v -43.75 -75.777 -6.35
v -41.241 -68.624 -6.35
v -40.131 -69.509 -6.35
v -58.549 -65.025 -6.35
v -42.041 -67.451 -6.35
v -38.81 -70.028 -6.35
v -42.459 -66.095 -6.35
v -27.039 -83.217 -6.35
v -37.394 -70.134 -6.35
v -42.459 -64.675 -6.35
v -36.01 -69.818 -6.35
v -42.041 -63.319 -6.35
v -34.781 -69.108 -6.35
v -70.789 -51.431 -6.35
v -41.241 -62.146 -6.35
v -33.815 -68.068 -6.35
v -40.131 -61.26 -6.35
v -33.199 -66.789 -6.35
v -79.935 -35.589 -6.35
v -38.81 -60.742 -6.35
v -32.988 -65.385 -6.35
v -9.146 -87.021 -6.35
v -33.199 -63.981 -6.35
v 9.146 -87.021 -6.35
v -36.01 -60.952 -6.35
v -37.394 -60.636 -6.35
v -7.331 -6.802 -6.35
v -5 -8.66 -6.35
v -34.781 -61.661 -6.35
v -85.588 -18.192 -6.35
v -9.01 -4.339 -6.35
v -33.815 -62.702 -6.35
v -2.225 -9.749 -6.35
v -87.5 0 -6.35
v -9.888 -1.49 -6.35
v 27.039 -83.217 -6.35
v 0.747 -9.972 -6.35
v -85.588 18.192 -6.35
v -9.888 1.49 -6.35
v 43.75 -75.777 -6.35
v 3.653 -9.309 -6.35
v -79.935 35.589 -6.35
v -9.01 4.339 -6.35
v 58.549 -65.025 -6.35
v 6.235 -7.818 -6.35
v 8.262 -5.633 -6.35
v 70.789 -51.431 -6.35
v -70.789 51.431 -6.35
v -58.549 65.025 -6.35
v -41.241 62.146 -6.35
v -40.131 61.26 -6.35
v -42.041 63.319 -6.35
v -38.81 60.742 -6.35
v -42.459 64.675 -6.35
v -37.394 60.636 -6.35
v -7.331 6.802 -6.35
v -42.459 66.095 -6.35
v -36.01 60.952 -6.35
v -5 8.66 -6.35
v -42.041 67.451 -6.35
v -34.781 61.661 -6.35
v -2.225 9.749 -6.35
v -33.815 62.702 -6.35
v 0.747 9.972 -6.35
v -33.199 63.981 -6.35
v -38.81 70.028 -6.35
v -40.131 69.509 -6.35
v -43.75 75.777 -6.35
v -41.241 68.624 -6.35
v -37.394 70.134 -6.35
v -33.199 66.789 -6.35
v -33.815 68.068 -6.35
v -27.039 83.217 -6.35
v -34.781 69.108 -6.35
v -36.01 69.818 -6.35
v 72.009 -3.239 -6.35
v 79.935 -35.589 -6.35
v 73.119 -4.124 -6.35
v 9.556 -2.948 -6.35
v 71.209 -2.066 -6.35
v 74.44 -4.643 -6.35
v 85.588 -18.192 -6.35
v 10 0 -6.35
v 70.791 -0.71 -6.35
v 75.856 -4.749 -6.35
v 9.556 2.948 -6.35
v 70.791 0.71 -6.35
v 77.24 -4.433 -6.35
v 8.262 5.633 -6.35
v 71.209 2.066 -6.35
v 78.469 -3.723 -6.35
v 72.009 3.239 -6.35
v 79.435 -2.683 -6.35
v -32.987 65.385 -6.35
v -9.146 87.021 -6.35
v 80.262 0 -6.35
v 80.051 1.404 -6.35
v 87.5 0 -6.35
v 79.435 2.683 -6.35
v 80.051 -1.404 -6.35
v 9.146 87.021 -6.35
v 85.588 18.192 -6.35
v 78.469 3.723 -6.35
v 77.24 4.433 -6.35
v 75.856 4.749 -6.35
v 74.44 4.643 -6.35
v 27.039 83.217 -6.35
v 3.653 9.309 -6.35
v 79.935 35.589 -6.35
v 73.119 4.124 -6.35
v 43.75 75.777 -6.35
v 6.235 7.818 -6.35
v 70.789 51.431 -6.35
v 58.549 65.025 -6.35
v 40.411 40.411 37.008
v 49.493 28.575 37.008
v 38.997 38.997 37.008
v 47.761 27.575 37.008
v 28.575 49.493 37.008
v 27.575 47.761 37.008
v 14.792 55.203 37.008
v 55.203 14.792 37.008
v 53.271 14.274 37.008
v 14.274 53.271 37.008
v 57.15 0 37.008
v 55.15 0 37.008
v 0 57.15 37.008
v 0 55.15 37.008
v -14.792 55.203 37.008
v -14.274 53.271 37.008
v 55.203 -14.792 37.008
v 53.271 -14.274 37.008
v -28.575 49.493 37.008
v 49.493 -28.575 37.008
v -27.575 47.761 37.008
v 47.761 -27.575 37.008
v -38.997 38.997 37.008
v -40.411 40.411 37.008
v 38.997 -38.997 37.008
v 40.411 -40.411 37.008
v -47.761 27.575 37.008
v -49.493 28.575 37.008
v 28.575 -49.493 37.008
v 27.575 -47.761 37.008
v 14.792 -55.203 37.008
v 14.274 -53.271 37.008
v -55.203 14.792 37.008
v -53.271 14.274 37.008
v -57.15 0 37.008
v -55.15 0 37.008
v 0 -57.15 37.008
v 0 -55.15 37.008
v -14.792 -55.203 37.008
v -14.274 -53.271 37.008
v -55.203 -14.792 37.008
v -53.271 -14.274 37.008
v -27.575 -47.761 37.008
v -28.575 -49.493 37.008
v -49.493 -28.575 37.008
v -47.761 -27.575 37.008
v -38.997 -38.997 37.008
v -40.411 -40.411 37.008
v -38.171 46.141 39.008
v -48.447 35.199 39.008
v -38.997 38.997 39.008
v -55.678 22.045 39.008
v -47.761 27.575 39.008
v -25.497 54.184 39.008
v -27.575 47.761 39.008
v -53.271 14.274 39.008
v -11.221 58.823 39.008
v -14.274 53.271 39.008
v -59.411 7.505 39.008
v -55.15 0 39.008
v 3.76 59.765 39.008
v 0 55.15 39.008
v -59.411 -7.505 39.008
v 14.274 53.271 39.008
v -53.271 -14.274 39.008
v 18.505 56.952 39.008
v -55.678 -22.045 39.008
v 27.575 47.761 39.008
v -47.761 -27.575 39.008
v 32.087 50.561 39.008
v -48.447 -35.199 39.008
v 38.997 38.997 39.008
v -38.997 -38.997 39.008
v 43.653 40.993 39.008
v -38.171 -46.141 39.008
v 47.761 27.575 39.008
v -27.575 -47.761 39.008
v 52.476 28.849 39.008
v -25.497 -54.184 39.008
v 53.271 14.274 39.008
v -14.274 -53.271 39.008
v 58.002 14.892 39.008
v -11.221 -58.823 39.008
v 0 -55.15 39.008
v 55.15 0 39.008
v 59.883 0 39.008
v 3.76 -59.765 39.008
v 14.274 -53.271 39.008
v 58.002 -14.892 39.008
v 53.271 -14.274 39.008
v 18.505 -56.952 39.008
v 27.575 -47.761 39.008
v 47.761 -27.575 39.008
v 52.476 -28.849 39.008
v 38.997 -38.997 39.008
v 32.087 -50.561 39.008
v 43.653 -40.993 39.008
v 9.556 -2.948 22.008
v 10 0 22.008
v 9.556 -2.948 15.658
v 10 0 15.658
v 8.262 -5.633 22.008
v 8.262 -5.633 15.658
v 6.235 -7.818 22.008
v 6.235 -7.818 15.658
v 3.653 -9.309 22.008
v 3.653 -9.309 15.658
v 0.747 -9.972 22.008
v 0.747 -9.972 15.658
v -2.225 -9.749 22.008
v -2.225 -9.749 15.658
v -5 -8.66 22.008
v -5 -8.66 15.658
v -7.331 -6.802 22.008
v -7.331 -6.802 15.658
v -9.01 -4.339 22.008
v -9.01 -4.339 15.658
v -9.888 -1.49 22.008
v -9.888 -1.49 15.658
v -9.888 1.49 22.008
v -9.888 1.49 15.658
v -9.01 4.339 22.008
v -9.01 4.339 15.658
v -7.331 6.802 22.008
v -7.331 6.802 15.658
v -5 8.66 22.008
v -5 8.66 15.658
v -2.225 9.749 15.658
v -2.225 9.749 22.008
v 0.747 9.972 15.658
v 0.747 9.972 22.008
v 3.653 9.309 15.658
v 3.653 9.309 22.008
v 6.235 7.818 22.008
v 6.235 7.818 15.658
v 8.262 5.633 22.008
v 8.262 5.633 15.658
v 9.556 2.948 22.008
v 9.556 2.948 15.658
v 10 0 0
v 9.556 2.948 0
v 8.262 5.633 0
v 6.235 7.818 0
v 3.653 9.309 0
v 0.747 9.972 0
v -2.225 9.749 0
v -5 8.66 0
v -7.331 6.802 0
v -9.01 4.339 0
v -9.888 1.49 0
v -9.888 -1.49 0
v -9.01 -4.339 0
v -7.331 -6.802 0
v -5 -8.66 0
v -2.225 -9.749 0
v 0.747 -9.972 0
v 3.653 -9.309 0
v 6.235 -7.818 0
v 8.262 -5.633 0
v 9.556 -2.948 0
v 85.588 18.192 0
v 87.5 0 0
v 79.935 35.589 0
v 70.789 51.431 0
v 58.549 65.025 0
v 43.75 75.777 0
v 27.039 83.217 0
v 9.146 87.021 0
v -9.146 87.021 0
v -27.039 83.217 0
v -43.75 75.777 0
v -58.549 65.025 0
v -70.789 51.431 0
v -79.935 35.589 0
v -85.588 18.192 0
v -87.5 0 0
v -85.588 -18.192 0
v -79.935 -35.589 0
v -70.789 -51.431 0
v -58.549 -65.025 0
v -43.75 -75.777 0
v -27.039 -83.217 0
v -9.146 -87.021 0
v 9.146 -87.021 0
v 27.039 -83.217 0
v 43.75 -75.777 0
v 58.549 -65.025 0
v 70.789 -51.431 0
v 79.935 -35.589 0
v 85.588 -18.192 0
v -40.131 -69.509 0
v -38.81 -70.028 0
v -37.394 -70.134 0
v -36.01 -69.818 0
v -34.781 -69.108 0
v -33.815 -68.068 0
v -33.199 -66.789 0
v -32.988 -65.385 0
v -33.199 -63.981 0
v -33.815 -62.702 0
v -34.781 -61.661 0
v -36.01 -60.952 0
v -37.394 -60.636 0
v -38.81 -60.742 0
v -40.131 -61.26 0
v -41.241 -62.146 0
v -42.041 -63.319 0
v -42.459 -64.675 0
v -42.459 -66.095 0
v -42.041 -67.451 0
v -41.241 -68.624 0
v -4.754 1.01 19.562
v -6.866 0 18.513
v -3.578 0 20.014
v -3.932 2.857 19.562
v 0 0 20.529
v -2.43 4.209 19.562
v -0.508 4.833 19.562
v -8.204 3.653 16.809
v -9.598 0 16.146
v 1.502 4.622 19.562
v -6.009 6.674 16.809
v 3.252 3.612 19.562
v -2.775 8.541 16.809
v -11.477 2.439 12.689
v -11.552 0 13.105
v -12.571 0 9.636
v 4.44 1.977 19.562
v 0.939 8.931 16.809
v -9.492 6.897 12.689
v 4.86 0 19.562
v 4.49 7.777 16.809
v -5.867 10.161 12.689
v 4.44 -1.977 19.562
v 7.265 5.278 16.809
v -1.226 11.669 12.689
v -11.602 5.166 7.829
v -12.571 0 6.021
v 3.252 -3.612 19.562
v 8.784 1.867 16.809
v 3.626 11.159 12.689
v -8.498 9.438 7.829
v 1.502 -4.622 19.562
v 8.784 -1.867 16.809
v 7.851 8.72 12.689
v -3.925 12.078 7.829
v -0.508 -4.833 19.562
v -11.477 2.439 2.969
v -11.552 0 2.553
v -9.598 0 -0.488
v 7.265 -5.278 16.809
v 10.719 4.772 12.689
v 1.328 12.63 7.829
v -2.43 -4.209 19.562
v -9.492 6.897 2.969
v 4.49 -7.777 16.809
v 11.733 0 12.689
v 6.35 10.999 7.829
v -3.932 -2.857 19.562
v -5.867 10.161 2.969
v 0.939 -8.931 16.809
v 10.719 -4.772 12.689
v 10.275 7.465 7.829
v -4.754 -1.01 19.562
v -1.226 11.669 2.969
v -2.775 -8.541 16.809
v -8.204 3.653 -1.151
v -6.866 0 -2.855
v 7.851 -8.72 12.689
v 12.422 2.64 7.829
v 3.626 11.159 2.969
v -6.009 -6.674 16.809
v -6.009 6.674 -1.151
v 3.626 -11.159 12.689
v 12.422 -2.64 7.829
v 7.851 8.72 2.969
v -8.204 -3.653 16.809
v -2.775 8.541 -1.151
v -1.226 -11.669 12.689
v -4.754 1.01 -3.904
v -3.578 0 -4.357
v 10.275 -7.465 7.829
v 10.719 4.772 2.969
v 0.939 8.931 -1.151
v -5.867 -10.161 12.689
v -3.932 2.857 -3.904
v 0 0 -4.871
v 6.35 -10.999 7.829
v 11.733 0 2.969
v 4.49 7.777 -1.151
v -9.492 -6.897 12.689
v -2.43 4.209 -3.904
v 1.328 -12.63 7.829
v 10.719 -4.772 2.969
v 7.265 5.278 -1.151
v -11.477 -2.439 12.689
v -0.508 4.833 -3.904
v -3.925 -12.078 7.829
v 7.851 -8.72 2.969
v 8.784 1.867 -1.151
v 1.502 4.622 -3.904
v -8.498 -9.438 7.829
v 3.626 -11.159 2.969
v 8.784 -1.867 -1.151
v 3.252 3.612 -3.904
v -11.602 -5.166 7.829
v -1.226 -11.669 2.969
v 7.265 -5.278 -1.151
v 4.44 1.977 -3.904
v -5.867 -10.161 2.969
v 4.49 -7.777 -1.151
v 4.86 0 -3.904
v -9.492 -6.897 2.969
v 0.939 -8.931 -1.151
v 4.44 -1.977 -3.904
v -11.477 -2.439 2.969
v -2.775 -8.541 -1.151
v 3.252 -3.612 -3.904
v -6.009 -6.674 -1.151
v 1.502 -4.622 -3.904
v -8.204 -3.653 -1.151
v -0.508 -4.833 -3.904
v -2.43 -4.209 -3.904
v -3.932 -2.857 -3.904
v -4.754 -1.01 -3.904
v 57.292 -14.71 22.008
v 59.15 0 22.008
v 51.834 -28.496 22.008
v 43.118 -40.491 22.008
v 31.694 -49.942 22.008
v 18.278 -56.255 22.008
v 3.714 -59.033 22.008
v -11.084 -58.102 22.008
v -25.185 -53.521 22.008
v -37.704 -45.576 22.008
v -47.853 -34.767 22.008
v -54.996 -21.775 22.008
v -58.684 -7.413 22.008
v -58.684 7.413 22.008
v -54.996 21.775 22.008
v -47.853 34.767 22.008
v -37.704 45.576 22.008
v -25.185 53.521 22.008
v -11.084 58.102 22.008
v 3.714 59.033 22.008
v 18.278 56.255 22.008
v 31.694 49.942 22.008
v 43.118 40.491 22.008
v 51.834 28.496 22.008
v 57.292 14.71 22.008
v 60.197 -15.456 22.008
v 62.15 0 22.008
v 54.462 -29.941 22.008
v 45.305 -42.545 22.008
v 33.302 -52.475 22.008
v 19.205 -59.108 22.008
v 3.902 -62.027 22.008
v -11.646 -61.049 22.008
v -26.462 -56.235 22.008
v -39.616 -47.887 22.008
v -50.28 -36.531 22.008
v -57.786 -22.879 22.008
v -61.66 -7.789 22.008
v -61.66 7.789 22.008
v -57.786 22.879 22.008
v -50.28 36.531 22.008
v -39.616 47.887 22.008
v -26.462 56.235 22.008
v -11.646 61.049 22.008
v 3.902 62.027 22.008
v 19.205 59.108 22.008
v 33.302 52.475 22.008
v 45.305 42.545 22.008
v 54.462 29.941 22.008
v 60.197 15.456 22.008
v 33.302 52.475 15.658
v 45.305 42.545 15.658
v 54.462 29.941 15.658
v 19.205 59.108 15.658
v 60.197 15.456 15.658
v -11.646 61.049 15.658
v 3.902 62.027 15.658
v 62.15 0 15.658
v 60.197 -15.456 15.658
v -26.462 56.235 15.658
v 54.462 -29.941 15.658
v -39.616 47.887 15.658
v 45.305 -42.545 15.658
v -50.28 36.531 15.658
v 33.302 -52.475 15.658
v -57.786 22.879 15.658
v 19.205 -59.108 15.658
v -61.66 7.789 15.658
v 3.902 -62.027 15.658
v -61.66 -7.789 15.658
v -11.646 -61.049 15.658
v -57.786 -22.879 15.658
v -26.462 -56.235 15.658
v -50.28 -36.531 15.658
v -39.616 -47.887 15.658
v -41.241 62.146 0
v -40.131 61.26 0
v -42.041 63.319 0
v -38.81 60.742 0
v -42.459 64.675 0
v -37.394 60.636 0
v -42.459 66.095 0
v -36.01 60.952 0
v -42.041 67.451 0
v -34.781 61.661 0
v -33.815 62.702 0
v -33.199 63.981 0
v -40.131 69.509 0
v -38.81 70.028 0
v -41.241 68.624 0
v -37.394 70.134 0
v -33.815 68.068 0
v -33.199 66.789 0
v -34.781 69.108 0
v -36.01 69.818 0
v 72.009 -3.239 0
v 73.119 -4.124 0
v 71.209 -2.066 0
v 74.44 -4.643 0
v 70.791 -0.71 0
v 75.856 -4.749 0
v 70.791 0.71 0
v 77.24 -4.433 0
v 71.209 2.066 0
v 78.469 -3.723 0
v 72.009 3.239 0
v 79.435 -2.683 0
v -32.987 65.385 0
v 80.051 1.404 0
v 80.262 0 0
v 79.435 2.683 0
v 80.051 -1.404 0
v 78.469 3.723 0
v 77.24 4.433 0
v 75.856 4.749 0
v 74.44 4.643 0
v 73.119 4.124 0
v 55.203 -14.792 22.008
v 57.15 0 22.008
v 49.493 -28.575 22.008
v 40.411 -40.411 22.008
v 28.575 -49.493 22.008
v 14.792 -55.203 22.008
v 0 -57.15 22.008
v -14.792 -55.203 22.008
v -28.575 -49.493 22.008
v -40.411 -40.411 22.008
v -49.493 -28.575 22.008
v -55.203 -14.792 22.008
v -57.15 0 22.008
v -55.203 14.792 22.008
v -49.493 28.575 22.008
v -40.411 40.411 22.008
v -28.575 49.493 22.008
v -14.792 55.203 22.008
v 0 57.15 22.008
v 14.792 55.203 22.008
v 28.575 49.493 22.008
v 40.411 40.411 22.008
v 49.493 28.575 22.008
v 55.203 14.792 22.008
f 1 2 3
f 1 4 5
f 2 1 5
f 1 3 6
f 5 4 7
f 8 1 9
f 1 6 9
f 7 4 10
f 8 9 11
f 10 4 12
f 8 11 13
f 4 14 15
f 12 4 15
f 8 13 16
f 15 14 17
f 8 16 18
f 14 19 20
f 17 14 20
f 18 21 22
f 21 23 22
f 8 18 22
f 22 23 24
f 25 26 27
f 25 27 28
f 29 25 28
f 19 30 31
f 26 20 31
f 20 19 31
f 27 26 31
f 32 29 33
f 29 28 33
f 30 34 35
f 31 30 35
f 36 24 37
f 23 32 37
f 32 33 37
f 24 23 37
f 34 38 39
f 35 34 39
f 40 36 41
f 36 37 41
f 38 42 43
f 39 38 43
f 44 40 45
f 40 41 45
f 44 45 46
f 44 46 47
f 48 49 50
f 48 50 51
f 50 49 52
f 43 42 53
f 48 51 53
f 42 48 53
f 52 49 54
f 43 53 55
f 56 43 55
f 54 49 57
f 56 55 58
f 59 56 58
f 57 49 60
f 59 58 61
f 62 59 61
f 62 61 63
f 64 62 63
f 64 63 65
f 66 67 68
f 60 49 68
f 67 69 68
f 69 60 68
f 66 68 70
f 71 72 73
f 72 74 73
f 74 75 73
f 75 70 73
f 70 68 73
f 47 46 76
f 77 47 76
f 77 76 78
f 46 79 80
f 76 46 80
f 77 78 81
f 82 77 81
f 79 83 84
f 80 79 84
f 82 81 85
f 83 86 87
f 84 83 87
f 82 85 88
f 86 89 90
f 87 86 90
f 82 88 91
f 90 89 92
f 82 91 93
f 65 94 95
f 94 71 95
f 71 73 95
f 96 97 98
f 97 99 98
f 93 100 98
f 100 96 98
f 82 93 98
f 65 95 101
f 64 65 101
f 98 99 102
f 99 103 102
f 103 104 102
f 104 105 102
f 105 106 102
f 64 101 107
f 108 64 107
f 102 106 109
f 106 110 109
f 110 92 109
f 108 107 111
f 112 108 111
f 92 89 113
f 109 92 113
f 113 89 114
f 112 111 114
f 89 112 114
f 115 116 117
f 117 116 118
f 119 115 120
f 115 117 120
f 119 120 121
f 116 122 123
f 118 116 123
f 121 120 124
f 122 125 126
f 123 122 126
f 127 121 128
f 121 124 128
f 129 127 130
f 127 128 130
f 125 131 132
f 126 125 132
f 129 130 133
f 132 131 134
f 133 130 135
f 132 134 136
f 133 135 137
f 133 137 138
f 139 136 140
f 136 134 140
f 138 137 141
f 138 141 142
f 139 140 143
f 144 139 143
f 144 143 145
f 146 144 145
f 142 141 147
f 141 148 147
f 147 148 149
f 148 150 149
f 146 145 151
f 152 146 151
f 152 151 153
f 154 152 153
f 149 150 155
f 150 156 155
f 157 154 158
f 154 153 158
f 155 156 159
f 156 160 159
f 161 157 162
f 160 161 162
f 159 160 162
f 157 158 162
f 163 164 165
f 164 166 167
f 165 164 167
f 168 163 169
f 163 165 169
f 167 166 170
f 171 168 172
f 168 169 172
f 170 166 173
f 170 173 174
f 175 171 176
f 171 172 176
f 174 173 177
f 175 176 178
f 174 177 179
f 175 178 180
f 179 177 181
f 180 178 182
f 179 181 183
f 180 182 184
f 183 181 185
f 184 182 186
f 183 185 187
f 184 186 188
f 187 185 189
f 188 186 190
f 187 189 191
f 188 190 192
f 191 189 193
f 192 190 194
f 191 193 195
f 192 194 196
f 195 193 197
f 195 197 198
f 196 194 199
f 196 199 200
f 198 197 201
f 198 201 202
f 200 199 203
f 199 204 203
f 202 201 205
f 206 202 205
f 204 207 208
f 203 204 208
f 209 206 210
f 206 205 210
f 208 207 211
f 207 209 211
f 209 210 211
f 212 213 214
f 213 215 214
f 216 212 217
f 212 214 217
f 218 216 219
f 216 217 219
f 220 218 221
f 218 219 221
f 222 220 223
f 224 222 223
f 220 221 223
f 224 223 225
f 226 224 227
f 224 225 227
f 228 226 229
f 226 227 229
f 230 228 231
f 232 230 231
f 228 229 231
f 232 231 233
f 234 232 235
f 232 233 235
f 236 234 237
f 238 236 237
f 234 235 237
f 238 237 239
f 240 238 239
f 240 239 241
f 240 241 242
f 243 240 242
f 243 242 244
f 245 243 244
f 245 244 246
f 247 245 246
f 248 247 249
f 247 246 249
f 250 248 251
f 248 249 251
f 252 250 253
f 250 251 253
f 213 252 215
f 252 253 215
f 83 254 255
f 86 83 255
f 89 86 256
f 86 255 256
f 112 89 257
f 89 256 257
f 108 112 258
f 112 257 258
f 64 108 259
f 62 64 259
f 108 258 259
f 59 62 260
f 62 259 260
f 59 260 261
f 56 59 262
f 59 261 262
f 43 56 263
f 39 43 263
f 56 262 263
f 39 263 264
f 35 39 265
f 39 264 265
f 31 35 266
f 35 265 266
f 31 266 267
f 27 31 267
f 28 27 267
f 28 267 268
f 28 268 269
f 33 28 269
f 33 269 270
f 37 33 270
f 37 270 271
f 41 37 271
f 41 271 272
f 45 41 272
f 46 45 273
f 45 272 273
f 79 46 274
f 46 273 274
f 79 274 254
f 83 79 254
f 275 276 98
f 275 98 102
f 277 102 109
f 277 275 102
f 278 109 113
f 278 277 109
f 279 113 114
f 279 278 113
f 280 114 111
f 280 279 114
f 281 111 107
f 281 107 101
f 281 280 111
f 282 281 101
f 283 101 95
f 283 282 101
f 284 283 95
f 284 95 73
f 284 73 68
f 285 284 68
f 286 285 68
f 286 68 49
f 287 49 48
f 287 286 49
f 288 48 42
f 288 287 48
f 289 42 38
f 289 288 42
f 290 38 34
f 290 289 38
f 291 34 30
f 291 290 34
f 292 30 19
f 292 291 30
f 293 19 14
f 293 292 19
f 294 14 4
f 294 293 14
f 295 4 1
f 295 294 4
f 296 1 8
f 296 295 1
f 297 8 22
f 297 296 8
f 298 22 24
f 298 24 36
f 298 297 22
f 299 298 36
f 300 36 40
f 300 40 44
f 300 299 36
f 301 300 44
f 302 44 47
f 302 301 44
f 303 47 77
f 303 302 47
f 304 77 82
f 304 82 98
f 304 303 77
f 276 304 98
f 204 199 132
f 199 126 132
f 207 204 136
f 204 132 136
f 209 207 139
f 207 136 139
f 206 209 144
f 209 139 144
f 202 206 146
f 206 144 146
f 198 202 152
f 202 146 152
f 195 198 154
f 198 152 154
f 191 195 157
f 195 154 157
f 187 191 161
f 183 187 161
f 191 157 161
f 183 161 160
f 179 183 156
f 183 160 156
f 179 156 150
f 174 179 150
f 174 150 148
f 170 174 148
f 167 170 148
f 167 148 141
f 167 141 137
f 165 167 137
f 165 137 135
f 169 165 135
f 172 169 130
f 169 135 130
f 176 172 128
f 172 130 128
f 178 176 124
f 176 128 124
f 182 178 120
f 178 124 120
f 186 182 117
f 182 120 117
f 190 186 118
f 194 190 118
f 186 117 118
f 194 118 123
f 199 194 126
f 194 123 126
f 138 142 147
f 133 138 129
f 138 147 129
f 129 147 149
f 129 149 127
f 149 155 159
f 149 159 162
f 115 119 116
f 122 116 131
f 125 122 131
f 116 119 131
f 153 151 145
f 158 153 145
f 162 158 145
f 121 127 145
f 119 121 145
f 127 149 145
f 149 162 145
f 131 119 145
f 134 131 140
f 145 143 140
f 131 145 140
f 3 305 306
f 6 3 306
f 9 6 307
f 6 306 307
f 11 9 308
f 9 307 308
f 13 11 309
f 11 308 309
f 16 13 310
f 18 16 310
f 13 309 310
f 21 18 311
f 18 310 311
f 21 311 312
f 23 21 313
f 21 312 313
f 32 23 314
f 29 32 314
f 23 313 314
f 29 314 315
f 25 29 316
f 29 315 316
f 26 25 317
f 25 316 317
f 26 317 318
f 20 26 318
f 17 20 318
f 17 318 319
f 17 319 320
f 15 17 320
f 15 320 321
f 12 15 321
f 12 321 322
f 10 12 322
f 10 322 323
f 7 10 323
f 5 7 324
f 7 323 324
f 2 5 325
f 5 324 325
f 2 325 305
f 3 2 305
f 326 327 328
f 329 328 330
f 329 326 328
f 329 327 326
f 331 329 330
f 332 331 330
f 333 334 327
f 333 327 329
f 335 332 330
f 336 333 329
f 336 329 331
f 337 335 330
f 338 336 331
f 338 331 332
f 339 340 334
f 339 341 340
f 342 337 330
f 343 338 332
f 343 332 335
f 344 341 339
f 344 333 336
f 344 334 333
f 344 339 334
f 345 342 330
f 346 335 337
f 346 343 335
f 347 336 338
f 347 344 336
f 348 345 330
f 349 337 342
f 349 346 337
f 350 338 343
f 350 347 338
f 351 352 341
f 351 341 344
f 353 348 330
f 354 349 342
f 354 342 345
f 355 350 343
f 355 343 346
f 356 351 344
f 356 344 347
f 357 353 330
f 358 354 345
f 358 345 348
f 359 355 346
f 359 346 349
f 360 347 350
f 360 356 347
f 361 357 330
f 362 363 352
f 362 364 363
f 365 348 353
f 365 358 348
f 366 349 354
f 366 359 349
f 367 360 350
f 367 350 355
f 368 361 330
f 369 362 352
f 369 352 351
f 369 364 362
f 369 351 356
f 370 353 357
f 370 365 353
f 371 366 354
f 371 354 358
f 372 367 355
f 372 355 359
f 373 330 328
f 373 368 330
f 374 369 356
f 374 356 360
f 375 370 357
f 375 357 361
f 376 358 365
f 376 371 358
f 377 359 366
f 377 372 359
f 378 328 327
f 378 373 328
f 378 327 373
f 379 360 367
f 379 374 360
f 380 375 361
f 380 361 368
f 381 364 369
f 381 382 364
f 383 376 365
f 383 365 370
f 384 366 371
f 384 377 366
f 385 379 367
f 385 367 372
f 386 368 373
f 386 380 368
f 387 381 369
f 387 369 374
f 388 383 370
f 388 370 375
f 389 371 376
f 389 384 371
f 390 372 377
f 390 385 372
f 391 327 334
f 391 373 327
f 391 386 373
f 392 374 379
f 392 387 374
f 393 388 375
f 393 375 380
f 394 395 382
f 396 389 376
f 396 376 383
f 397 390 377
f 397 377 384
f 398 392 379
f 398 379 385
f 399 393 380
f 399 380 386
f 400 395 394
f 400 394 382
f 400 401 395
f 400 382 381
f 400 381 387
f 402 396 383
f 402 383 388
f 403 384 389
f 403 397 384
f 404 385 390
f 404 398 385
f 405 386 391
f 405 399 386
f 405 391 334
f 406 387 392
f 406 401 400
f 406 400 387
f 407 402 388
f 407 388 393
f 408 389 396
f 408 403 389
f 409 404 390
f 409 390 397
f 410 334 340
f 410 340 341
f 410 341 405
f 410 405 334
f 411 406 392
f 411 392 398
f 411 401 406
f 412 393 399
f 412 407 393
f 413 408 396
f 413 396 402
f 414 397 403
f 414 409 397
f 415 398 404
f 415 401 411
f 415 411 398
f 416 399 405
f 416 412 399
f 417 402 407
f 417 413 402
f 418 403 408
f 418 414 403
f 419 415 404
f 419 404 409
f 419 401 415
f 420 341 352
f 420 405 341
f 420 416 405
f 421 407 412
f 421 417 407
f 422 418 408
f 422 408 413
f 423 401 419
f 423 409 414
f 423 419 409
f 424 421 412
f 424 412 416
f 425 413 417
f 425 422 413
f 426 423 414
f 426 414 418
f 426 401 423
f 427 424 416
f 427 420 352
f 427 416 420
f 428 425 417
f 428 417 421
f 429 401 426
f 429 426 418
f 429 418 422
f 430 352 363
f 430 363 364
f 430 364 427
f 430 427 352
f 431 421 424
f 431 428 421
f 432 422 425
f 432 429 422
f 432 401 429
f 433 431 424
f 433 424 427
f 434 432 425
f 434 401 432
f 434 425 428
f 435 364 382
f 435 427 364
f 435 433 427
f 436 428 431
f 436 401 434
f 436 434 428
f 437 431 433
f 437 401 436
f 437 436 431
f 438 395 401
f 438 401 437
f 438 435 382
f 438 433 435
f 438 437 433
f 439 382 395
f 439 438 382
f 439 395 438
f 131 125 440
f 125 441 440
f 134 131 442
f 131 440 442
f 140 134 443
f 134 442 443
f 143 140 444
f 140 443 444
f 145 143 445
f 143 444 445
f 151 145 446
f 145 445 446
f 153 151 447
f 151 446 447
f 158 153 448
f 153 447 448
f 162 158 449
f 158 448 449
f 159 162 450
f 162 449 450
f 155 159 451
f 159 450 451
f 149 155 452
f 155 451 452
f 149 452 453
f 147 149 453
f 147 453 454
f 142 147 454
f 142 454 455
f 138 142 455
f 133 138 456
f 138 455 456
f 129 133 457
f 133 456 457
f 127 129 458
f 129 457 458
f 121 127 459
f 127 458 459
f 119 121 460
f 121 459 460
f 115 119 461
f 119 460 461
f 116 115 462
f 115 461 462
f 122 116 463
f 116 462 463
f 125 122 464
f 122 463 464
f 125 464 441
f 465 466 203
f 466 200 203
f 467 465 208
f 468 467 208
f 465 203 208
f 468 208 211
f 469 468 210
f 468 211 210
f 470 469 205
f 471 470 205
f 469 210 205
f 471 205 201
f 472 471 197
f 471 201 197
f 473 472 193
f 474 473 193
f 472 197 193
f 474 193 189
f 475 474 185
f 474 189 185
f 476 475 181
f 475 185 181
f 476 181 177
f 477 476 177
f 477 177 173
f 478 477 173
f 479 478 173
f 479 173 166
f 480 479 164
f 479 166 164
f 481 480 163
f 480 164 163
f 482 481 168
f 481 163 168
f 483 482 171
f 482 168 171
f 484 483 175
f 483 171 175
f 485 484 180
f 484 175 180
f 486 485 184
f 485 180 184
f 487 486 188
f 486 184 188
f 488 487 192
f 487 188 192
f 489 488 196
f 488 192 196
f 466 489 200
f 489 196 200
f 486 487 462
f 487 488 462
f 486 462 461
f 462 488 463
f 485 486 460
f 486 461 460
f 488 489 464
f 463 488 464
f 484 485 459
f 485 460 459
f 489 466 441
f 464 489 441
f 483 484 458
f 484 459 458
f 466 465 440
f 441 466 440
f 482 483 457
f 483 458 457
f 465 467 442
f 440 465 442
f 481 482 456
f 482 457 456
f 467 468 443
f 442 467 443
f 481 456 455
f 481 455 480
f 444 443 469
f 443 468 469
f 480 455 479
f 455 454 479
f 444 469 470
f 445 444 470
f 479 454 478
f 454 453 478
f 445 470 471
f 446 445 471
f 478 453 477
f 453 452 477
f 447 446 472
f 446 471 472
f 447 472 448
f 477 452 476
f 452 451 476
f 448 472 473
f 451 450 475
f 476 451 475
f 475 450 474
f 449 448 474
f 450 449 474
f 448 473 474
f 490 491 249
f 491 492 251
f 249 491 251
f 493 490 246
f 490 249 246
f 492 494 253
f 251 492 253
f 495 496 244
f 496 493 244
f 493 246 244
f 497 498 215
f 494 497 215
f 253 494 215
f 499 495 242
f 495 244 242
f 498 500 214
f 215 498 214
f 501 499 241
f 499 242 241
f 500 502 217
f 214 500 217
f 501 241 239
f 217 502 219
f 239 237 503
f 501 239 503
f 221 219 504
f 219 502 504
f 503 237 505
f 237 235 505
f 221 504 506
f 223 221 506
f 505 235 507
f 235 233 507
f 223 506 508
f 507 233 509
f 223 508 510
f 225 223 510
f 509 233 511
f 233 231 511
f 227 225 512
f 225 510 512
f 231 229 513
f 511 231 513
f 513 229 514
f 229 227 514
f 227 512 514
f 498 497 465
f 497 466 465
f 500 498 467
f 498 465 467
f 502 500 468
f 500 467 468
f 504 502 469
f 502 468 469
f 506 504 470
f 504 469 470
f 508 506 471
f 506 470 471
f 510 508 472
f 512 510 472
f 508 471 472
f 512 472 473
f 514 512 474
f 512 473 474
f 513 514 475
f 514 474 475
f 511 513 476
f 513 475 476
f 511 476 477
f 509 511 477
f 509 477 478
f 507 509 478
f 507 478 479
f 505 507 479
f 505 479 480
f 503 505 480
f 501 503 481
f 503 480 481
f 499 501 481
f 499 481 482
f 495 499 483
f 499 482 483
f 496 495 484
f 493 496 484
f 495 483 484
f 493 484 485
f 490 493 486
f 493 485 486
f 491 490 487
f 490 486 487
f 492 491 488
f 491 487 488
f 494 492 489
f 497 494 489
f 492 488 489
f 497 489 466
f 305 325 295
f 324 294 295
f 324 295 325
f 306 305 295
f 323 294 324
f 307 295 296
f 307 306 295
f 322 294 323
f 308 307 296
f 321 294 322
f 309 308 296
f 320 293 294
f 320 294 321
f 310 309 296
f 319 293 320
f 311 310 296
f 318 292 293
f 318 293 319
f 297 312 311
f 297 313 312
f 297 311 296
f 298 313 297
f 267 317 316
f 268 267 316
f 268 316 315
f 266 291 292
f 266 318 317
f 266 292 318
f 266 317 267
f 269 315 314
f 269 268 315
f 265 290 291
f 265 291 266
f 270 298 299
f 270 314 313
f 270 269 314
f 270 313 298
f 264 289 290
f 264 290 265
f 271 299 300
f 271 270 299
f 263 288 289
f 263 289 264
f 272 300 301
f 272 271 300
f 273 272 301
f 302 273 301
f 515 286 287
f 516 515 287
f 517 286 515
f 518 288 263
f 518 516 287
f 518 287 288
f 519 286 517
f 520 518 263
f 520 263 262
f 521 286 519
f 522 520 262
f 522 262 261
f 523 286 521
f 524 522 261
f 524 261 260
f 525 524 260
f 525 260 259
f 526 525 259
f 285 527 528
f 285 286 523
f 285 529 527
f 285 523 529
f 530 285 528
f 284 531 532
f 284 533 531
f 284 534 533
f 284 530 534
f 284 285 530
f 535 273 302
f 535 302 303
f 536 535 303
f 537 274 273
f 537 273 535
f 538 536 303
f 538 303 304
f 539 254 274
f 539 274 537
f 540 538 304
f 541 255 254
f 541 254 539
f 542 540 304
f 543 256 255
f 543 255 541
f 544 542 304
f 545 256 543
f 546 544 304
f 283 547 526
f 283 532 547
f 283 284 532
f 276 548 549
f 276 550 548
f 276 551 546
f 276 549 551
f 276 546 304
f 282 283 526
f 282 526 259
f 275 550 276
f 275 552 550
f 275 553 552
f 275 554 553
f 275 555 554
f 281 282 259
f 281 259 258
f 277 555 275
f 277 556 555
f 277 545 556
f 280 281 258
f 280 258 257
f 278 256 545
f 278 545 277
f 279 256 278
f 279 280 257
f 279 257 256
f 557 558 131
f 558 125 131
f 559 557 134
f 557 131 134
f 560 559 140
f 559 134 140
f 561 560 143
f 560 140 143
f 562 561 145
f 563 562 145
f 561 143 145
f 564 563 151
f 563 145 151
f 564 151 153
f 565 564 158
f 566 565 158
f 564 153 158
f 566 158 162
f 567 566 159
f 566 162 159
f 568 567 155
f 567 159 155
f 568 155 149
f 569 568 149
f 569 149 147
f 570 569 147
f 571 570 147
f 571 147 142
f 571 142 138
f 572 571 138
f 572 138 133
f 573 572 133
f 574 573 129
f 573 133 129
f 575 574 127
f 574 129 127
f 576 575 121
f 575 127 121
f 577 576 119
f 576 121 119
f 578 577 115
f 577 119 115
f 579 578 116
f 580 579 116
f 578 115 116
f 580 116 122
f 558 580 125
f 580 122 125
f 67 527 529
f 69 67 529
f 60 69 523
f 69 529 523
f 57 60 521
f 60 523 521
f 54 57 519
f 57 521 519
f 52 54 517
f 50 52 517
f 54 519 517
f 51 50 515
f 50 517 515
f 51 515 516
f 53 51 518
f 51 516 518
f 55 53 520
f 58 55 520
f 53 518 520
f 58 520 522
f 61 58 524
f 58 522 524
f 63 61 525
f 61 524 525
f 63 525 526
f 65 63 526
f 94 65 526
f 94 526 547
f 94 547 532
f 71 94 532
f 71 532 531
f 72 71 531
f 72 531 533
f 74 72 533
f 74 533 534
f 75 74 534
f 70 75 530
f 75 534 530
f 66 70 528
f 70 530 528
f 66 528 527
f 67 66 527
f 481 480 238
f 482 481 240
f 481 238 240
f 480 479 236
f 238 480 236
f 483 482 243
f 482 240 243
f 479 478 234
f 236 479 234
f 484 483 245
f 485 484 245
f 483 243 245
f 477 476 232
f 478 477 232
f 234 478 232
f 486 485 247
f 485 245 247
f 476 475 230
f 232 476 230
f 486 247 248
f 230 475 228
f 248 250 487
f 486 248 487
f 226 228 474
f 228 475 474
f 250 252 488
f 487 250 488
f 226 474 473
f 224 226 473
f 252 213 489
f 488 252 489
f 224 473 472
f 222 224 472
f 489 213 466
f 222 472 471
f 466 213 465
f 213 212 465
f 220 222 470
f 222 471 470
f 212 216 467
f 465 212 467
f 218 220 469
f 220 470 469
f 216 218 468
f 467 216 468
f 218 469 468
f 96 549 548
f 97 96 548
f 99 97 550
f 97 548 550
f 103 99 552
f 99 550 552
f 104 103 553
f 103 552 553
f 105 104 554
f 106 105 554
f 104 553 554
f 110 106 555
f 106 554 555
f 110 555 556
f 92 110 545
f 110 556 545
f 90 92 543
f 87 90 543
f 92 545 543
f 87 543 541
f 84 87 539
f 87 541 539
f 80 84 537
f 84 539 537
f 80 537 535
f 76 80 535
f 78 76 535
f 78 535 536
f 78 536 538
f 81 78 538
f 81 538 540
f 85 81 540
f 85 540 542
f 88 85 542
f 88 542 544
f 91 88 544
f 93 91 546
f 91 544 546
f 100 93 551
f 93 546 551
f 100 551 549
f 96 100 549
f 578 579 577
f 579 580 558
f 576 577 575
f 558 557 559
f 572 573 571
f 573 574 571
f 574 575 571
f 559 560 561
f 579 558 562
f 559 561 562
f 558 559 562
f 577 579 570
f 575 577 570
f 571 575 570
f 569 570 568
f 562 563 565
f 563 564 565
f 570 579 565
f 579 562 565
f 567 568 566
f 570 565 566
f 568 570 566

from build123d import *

# Parameters (mm, degrees)
F0_R            = 87.5
F0_R_2          = 10
F0_R_3          = 4.7625
F1_DEPTH        = 6.35
F2_DEPTH        = 6.35
F2_COPIES_COUNT = 3


# Not quite as in the source:
# - a length typed as a fraction of an inch, garbled in the dataset ("3 / 203.2 mm" for 3/8 in), is restored
# - a pattern or mirror of a feature is missing from the dataset's text; its kind, count and spacing are read off the source's solid
# - a feature names something its author has since deleted; it is built from what else it names


with BuildPart() as f1:
    # F0 (on Top) → F1 (new body)
    with BuildSketch(Plane.XY):
        Circle(F0_R)
        Circle(F0_R_2, mode=Mode.SUBTRACT)
        with Locations((75.5, 0)):
            Circle(F0_R_3, mode=Mode.SUBTRACT)
        with Locations((75.5, 0)):
            Circle(F0_R_3)
    extrude(amount=-F1_DEPTH)

    # F0 (on Top) → F2 (cut, through all)
    with BuildSketch(Plane.XY):
        with Locations((75.5, 0)):
            Circle(F0_R_3)
    f2 = extrude(amount=-F2_DEPTH, mode=Mode.SUBTRACT)

    # F2_copies: F2 ×3 about axis
    f2_copies_axis = Axis((0, 0, 0), (0, 0, 1))
    for i in range(1, F2_COPIES_COUNT):
        add(f2.rotate(f2_copies_axis, i * 360 / F2_COPIES_COUNT), mode=Mode.SUBTRACT)


with BuildPart() as f4:
    # F3 (on Front) → F4 (revolve)
    with BuildSketch(Plane.XZ):
        with BuildLine():
            ThreePointArc((0, 20.5287930104), (-12.7, 7.8287930104), (0, -4.8712069896))
            Line((0, -4.8712069896), (0, 20.5287930104))
        make_face()
    revolve(axis=Axis((0, 0, 7.8287930104), (0, 0, -1)))


with BuildPart() as f5:
    # F3 (on Front) → F5 (revolve)
    with BuildSketch(Plane.XZ):
        Polygon((0, 22.0075860208), (10, 22.0075860208), (57.15, 22.0075860208), (57.15, 37.0075860208), (55.15, 37.0075860208), (0, 37.0075860208), align=None)
    revolve(axis=Axis((0, 0, 29.5075860208), (0, 0, -1)))


with BuildPart() as f6:
    # F3 (on Front) → F6 (revolve)
    with BuildSketch(Plane.XZ):
        Polygon((10, 22.0075860208), (10, 15.6575860208), (62.15, 15.6575860208), (62.15, 22.0075860208), (59.15, 22.0075860208), (57.15, 22.0075860208), align=None)
    revolve(axis=Axis((0, 0, 7.8287930104), (0, 0, -1)))


with BuildPart() as f7:
    # F3 (on Front) → F7 (revolve)
    with BuildSketch(Plane.XZ):
        Polygon((59.15, 22.0075860208), (62.15, 22.0075860208), (59.8833333333, 39.0075860208), (55.15, 39.0075860208), (55.15, 37.0075860208), (57.15, 37.0075860208), align=None)
    revolve(axis=Axis((0, 0, 29.5075860208), (0, 0, -1)))


solid = Compound([f1.part, f4.part, f5.part, f6.part, f7.part])
